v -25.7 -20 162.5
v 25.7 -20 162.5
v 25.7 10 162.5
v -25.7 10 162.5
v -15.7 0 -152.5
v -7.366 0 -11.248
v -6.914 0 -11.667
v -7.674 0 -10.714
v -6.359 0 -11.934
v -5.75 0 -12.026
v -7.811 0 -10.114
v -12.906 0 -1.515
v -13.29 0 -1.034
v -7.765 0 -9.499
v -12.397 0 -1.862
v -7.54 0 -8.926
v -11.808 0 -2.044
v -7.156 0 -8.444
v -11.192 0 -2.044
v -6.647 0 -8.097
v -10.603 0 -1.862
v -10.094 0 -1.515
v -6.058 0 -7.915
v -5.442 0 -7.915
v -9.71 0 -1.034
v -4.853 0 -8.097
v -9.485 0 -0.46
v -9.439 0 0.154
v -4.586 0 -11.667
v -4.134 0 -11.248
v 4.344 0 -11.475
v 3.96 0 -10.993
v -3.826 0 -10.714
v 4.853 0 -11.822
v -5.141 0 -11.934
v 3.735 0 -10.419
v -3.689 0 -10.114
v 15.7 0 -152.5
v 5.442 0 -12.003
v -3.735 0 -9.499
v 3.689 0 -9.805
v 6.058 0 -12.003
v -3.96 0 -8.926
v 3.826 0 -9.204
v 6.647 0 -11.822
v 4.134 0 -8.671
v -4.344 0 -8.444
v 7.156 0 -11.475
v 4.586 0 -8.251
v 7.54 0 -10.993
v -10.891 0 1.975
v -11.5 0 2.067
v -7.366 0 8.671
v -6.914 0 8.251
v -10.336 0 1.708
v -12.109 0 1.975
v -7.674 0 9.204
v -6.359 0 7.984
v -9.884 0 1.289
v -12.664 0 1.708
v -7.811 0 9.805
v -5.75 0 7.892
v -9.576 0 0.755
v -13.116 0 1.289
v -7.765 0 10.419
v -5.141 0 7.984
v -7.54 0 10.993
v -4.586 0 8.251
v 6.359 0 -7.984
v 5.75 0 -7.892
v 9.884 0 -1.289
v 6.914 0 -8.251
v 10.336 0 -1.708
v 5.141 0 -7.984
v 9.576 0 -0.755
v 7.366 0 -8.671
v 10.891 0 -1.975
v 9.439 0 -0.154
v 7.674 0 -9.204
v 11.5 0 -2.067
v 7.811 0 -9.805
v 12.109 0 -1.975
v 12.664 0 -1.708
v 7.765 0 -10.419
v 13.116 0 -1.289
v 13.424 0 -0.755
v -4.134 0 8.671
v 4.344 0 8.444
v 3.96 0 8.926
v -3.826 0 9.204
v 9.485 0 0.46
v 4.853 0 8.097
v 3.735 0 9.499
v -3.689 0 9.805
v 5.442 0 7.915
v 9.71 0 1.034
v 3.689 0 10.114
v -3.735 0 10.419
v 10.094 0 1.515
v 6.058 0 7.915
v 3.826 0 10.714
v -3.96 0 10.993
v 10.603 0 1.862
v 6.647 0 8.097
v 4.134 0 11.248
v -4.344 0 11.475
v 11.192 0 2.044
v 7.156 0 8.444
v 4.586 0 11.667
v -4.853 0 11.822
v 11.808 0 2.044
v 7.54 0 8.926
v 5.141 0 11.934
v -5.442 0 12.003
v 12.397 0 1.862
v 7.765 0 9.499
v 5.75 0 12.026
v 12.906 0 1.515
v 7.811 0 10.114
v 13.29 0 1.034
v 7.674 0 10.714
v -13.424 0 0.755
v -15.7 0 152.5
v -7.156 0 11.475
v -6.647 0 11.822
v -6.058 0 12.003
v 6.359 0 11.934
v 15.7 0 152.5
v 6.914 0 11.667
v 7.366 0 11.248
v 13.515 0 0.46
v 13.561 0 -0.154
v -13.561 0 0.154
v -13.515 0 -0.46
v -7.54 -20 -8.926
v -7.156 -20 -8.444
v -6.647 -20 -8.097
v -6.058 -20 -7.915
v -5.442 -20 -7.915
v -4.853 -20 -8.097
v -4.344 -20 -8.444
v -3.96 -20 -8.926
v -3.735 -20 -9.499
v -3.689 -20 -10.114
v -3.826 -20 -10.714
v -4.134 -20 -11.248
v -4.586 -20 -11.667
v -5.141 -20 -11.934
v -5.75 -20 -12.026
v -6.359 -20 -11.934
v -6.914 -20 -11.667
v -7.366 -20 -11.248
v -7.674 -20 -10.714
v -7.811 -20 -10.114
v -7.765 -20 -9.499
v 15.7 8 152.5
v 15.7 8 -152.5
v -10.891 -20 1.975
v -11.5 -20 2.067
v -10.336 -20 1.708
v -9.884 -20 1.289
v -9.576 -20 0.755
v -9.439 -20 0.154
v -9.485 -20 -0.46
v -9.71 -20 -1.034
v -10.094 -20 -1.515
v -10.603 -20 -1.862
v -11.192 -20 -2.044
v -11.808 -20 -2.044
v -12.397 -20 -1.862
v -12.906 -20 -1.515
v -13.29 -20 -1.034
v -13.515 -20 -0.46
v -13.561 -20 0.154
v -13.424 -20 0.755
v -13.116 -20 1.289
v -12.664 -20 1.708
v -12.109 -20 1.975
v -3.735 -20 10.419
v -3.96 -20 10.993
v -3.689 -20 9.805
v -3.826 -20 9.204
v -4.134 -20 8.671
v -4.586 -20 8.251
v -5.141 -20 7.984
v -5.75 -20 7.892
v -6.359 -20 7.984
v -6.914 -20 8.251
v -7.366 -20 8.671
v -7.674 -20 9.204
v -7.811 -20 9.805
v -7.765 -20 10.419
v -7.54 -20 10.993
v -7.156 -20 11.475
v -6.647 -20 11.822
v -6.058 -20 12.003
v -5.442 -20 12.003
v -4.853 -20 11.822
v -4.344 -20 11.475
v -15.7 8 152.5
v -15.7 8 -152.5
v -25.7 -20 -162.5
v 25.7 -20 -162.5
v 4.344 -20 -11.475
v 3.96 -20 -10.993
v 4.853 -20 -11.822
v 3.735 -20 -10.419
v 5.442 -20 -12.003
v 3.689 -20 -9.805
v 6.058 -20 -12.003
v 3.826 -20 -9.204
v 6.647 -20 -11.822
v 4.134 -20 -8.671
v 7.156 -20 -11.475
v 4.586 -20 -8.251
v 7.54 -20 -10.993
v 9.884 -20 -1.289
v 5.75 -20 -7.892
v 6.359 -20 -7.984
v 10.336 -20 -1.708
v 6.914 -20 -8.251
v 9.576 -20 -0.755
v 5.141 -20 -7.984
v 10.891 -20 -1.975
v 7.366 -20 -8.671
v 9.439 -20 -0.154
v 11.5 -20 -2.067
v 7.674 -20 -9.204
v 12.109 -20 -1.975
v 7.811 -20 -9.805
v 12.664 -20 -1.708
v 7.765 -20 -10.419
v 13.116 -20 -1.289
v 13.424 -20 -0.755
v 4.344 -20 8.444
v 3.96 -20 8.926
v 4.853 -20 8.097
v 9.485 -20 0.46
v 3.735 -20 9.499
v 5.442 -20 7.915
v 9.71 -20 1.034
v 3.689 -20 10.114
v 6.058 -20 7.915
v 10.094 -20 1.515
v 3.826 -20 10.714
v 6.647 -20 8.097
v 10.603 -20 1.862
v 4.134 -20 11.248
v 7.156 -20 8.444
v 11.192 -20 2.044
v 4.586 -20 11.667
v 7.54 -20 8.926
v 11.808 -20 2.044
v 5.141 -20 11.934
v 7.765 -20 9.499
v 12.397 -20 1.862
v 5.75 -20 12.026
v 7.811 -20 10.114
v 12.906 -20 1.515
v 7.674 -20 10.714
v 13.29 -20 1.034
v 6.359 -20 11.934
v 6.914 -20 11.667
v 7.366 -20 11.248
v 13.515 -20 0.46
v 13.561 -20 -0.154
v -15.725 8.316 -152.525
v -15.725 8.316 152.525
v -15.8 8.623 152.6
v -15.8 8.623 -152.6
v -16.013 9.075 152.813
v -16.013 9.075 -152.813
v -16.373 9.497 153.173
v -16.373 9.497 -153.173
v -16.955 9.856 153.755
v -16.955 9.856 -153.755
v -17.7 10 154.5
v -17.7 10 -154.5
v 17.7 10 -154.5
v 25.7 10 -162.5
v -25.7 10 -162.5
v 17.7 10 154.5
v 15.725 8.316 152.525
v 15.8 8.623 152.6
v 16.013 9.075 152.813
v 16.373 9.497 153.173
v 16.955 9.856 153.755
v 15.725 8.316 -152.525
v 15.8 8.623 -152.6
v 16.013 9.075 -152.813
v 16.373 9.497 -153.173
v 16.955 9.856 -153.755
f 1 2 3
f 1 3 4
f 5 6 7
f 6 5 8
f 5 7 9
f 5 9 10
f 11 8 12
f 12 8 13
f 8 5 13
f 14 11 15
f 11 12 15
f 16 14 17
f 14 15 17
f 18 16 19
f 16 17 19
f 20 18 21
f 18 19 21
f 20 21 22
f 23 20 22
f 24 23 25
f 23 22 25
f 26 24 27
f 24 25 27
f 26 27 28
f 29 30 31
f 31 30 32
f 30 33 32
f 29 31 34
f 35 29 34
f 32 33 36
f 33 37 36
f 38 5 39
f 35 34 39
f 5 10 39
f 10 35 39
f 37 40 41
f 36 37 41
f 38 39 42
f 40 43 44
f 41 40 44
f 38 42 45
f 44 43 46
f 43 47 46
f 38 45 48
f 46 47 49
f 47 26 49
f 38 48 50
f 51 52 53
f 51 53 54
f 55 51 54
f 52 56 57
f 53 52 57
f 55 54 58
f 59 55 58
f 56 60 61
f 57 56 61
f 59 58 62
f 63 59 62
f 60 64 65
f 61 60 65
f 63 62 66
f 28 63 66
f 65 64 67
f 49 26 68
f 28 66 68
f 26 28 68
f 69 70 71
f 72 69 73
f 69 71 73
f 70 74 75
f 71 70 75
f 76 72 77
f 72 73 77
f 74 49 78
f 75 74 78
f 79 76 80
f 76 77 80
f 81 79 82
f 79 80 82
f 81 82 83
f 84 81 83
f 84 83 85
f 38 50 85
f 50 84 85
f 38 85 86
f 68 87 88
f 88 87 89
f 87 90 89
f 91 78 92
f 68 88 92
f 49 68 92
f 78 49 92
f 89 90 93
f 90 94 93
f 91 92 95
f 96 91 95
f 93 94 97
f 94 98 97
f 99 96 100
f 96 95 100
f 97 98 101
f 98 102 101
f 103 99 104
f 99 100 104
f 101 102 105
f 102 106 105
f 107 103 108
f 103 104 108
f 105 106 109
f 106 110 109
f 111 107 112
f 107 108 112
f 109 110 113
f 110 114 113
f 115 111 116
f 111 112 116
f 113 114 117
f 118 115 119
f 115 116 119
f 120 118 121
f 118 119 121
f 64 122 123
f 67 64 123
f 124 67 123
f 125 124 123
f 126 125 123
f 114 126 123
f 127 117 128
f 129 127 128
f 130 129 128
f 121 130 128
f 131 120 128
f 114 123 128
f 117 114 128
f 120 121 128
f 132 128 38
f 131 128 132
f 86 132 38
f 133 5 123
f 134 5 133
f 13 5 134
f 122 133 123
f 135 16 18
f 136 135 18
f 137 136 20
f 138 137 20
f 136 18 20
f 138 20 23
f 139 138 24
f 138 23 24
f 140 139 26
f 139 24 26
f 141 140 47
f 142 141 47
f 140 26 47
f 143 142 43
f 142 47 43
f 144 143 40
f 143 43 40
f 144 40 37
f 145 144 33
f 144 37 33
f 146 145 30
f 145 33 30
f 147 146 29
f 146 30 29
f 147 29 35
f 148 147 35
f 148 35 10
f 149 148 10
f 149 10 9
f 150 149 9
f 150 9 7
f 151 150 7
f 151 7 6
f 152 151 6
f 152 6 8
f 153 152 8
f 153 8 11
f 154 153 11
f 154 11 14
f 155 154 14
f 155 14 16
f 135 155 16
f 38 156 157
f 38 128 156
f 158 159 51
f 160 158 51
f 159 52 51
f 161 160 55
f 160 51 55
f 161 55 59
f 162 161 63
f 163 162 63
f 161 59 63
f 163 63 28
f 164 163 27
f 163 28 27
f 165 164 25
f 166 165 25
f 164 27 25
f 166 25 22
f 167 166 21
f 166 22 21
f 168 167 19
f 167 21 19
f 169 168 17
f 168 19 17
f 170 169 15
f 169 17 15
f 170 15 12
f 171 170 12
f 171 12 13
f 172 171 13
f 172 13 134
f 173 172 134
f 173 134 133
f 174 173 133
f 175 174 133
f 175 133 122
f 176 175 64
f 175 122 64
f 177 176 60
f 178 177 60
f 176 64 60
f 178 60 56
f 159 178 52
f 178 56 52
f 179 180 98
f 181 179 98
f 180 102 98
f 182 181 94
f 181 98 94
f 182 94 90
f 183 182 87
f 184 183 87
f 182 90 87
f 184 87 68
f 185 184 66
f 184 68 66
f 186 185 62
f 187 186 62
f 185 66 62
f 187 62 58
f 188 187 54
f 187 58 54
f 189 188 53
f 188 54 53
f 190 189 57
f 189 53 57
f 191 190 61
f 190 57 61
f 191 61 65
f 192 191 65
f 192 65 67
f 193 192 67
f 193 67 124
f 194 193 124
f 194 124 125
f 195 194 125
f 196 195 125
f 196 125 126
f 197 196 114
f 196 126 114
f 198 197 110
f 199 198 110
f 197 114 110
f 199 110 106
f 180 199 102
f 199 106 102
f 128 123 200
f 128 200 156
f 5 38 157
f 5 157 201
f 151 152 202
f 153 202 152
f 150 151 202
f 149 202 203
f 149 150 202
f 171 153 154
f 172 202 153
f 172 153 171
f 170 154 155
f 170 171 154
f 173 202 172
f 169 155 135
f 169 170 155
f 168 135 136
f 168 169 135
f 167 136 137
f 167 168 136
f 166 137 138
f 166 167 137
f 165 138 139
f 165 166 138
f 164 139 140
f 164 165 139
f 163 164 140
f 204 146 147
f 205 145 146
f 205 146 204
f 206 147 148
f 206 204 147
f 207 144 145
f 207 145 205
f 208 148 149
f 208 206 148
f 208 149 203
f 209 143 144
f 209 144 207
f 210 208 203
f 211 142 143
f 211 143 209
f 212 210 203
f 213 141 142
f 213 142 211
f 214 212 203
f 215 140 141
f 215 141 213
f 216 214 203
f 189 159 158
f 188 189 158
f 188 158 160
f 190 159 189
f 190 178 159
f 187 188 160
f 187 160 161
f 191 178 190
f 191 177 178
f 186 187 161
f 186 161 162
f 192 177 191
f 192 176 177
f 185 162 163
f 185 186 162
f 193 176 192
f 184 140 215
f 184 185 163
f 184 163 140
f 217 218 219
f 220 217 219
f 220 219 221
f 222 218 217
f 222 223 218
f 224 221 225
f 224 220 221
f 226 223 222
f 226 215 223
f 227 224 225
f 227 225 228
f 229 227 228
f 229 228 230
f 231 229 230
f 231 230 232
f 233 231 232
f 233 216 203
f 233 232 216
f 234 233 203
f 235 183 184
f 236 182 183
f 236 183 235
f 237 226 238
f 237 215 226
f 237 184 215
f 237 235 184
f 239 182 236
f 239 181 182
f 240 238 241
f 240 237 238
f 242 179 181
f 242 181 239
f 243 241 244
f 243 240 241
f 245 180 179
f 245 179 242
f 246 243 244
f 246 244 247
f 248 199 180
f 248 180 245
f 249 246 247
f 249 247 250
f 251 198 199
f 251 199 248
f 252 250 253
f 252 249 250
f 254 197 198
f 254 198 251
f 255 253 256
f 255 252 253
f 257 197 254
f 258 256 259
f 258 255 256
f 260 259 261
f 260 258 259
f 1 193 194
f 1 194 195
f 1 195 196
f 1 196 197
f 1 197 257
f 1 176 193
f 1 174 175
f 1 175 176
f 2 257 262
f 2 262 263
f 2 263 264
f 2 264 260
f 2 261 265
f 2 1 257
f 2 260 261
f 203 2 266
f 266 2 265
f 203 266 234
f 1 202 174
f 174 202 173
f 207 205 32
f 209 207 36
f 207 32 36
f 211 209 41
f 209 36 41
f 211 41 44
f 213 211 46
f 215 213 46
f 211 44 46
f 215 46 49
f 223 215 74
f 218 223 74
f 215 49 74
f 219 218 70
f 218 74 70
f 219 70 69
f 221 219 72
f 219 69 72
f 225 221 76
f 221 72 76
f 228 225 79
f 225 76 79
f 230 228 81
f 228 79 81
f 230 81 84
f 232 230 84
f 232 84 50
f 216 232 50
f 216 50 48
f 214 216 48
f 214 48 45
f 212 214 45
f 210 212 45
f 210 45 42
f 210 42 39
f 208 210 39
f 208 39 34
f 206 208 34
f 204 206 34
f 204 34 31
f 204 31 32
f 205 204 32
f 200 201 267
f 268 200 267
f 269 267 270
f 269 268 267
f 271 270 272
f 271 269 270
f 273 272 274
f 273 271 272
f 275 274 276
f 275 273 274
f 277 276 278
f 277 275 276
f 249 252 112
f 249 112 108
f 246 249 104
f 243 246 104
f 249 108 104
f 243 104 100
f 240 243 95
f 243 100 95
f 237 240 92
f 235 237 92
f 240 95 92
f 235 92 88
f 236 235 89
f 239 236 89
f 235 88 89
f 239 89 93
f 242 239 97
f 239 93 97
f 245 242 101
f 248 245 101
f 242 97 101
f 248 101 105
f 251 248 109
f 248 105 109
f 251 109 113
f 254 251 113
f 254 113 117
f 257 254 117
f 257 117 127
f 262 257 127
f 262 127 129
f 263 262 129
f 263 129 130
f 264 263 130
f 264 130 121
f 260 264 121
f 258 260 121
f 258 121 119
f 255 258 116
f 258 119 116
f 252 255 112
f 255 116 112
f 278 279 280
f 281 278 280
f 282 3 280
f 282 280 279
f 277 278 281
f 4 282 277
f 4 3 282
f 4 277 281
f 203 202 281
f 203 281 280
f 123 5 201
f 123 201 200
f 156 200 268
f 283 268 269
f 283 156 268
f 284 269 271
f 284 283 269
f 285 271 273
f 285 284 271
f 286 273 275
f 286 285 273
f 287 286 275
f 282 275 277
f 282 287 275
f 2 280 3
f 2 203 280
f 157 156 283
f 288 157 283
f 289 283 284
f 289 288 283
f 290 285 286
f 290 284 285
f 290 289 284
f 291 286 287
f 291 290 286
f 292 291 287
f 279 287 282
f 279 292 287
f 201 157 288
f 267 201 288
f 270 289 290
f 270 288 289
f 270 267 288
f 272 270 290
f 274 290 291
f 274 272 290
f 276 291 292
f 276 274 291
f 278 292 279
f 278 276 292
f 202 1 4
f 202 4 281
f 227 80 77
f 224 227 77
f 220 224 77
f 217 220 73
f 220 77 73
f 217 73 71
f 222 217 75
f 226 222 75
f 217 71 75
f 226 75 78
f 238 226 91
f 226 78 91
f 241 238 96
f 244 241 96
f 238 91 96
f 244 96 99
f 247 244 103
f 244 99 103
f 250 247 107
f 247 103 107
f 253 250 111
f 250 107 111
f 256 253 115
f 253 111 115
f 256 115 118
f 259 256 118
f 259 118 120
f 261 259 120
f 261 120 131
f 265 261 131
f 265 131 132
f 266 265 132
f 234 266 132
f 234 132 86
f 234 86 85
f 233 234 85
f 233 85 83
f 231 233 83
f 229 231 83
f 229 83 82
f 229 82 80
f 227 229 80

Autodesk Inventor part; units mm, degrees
ref_plane "YZ Plane" through (0, 0, 0) normal (1, 0, 0) x (0, 1, 0)
ref_plane "XZ Plane" through (0, 0, 0) normal (0, 1, 0) x (-1, 0, 0)
ref_plane "XY Plane" through (0, 0, 0) normal (0, 0, 1) x (1, 0, 0)
sketch "Sketch1" plane through (0, 0, 0) normal (0, 1, 0) x (-1, 0, 0)
  line L0 (-15.7, -152.5) -> (15.7, -152.5)
  line L1 (15.7, -152.5) -> (15.7, 152.5)
  line L2 (15.7, 152.5) -> (-15.7, 152.5)
  line L3 (-15.7, 152.5) -> (-15.7, -152.5)
  line L4 (-15.7, -152.5) -> (15.7, 152.5) construction
  line L5 (15.7, -152.5) -> (-15.7, 152.5) construction
  line L6 (25.7, 162.5) -> (25.7, -162.5)
  line L7 (25.7, -162.5) -> (-25.7, -162.5)
  line L8 (-25.7, -162.5) -> (-25.7, 162.5)
  line L9 (-25.7, 162.5) -> (25.7, 162.5)
  point P0 (0, 0)
  dimension "d0" = 31.4
  dimension "d1" = 305
  dimension "d2" = 10
extrude "Extrusion1" add sketch "Sketch1" along normal blind 10
sketch "Sketch2" plane through (0, 0, 0) normal (0, -1, 0) x (1, 0, 0)
  line L0 (25.7, 162.5) -> (25.7, -162.5) projected
  line L1 (-25.7, 162.5) -> (25.7, 162.5) projected
  line L2 (-25.7, -162.5) -> (-25.7, 162.5) projected
  line L3 (25.7, -162.5) -> (-25.7, -162.5) projected
  line L4 (-15.7, 152.5) -> (-15.7, -152.5) projected
  line L5 (15.7, 152.5) -> (-15.7, 152.5) projected
  line L6 (15.7, -152.5) -> (15.7, 152.5) projected
  line L7 (-15.7, -152.5) -> (15.7, -152.5) projected
  point P0 (0, 0)
extrude "Extrusion2" add sketch "Sketch2" along normal blind 20 contours L0 L3 L2 L1 | L5 L6 L7 L4
sketch "Sketch4" plane through (0, -20, 0) normal (0, -1, 0) x (1, 0, 0)
  point P0 (0, 0)
  point P1 (11.5, 0)
  dimension "d14" = 11.5
hole "Hole2" at (11.5, -20, 0) direction (0, 1, 0) diameter 4.134 end through all thread size "M5x0.8" class "6H" standard "ANSI Metric M Profile"
pattern_circular "Circular Pattern1" count 6 over 360 about axis through (0, -10, 0) along (0, 1, 0) of "Hole2"
fillet "Fillet1" radius 2 4 edges at (-15.7, 10, 0) (0, 10, -152.5) (15.7, 10, 0) (0, 10, 152.5)
properties part number "enclosure_btm"
